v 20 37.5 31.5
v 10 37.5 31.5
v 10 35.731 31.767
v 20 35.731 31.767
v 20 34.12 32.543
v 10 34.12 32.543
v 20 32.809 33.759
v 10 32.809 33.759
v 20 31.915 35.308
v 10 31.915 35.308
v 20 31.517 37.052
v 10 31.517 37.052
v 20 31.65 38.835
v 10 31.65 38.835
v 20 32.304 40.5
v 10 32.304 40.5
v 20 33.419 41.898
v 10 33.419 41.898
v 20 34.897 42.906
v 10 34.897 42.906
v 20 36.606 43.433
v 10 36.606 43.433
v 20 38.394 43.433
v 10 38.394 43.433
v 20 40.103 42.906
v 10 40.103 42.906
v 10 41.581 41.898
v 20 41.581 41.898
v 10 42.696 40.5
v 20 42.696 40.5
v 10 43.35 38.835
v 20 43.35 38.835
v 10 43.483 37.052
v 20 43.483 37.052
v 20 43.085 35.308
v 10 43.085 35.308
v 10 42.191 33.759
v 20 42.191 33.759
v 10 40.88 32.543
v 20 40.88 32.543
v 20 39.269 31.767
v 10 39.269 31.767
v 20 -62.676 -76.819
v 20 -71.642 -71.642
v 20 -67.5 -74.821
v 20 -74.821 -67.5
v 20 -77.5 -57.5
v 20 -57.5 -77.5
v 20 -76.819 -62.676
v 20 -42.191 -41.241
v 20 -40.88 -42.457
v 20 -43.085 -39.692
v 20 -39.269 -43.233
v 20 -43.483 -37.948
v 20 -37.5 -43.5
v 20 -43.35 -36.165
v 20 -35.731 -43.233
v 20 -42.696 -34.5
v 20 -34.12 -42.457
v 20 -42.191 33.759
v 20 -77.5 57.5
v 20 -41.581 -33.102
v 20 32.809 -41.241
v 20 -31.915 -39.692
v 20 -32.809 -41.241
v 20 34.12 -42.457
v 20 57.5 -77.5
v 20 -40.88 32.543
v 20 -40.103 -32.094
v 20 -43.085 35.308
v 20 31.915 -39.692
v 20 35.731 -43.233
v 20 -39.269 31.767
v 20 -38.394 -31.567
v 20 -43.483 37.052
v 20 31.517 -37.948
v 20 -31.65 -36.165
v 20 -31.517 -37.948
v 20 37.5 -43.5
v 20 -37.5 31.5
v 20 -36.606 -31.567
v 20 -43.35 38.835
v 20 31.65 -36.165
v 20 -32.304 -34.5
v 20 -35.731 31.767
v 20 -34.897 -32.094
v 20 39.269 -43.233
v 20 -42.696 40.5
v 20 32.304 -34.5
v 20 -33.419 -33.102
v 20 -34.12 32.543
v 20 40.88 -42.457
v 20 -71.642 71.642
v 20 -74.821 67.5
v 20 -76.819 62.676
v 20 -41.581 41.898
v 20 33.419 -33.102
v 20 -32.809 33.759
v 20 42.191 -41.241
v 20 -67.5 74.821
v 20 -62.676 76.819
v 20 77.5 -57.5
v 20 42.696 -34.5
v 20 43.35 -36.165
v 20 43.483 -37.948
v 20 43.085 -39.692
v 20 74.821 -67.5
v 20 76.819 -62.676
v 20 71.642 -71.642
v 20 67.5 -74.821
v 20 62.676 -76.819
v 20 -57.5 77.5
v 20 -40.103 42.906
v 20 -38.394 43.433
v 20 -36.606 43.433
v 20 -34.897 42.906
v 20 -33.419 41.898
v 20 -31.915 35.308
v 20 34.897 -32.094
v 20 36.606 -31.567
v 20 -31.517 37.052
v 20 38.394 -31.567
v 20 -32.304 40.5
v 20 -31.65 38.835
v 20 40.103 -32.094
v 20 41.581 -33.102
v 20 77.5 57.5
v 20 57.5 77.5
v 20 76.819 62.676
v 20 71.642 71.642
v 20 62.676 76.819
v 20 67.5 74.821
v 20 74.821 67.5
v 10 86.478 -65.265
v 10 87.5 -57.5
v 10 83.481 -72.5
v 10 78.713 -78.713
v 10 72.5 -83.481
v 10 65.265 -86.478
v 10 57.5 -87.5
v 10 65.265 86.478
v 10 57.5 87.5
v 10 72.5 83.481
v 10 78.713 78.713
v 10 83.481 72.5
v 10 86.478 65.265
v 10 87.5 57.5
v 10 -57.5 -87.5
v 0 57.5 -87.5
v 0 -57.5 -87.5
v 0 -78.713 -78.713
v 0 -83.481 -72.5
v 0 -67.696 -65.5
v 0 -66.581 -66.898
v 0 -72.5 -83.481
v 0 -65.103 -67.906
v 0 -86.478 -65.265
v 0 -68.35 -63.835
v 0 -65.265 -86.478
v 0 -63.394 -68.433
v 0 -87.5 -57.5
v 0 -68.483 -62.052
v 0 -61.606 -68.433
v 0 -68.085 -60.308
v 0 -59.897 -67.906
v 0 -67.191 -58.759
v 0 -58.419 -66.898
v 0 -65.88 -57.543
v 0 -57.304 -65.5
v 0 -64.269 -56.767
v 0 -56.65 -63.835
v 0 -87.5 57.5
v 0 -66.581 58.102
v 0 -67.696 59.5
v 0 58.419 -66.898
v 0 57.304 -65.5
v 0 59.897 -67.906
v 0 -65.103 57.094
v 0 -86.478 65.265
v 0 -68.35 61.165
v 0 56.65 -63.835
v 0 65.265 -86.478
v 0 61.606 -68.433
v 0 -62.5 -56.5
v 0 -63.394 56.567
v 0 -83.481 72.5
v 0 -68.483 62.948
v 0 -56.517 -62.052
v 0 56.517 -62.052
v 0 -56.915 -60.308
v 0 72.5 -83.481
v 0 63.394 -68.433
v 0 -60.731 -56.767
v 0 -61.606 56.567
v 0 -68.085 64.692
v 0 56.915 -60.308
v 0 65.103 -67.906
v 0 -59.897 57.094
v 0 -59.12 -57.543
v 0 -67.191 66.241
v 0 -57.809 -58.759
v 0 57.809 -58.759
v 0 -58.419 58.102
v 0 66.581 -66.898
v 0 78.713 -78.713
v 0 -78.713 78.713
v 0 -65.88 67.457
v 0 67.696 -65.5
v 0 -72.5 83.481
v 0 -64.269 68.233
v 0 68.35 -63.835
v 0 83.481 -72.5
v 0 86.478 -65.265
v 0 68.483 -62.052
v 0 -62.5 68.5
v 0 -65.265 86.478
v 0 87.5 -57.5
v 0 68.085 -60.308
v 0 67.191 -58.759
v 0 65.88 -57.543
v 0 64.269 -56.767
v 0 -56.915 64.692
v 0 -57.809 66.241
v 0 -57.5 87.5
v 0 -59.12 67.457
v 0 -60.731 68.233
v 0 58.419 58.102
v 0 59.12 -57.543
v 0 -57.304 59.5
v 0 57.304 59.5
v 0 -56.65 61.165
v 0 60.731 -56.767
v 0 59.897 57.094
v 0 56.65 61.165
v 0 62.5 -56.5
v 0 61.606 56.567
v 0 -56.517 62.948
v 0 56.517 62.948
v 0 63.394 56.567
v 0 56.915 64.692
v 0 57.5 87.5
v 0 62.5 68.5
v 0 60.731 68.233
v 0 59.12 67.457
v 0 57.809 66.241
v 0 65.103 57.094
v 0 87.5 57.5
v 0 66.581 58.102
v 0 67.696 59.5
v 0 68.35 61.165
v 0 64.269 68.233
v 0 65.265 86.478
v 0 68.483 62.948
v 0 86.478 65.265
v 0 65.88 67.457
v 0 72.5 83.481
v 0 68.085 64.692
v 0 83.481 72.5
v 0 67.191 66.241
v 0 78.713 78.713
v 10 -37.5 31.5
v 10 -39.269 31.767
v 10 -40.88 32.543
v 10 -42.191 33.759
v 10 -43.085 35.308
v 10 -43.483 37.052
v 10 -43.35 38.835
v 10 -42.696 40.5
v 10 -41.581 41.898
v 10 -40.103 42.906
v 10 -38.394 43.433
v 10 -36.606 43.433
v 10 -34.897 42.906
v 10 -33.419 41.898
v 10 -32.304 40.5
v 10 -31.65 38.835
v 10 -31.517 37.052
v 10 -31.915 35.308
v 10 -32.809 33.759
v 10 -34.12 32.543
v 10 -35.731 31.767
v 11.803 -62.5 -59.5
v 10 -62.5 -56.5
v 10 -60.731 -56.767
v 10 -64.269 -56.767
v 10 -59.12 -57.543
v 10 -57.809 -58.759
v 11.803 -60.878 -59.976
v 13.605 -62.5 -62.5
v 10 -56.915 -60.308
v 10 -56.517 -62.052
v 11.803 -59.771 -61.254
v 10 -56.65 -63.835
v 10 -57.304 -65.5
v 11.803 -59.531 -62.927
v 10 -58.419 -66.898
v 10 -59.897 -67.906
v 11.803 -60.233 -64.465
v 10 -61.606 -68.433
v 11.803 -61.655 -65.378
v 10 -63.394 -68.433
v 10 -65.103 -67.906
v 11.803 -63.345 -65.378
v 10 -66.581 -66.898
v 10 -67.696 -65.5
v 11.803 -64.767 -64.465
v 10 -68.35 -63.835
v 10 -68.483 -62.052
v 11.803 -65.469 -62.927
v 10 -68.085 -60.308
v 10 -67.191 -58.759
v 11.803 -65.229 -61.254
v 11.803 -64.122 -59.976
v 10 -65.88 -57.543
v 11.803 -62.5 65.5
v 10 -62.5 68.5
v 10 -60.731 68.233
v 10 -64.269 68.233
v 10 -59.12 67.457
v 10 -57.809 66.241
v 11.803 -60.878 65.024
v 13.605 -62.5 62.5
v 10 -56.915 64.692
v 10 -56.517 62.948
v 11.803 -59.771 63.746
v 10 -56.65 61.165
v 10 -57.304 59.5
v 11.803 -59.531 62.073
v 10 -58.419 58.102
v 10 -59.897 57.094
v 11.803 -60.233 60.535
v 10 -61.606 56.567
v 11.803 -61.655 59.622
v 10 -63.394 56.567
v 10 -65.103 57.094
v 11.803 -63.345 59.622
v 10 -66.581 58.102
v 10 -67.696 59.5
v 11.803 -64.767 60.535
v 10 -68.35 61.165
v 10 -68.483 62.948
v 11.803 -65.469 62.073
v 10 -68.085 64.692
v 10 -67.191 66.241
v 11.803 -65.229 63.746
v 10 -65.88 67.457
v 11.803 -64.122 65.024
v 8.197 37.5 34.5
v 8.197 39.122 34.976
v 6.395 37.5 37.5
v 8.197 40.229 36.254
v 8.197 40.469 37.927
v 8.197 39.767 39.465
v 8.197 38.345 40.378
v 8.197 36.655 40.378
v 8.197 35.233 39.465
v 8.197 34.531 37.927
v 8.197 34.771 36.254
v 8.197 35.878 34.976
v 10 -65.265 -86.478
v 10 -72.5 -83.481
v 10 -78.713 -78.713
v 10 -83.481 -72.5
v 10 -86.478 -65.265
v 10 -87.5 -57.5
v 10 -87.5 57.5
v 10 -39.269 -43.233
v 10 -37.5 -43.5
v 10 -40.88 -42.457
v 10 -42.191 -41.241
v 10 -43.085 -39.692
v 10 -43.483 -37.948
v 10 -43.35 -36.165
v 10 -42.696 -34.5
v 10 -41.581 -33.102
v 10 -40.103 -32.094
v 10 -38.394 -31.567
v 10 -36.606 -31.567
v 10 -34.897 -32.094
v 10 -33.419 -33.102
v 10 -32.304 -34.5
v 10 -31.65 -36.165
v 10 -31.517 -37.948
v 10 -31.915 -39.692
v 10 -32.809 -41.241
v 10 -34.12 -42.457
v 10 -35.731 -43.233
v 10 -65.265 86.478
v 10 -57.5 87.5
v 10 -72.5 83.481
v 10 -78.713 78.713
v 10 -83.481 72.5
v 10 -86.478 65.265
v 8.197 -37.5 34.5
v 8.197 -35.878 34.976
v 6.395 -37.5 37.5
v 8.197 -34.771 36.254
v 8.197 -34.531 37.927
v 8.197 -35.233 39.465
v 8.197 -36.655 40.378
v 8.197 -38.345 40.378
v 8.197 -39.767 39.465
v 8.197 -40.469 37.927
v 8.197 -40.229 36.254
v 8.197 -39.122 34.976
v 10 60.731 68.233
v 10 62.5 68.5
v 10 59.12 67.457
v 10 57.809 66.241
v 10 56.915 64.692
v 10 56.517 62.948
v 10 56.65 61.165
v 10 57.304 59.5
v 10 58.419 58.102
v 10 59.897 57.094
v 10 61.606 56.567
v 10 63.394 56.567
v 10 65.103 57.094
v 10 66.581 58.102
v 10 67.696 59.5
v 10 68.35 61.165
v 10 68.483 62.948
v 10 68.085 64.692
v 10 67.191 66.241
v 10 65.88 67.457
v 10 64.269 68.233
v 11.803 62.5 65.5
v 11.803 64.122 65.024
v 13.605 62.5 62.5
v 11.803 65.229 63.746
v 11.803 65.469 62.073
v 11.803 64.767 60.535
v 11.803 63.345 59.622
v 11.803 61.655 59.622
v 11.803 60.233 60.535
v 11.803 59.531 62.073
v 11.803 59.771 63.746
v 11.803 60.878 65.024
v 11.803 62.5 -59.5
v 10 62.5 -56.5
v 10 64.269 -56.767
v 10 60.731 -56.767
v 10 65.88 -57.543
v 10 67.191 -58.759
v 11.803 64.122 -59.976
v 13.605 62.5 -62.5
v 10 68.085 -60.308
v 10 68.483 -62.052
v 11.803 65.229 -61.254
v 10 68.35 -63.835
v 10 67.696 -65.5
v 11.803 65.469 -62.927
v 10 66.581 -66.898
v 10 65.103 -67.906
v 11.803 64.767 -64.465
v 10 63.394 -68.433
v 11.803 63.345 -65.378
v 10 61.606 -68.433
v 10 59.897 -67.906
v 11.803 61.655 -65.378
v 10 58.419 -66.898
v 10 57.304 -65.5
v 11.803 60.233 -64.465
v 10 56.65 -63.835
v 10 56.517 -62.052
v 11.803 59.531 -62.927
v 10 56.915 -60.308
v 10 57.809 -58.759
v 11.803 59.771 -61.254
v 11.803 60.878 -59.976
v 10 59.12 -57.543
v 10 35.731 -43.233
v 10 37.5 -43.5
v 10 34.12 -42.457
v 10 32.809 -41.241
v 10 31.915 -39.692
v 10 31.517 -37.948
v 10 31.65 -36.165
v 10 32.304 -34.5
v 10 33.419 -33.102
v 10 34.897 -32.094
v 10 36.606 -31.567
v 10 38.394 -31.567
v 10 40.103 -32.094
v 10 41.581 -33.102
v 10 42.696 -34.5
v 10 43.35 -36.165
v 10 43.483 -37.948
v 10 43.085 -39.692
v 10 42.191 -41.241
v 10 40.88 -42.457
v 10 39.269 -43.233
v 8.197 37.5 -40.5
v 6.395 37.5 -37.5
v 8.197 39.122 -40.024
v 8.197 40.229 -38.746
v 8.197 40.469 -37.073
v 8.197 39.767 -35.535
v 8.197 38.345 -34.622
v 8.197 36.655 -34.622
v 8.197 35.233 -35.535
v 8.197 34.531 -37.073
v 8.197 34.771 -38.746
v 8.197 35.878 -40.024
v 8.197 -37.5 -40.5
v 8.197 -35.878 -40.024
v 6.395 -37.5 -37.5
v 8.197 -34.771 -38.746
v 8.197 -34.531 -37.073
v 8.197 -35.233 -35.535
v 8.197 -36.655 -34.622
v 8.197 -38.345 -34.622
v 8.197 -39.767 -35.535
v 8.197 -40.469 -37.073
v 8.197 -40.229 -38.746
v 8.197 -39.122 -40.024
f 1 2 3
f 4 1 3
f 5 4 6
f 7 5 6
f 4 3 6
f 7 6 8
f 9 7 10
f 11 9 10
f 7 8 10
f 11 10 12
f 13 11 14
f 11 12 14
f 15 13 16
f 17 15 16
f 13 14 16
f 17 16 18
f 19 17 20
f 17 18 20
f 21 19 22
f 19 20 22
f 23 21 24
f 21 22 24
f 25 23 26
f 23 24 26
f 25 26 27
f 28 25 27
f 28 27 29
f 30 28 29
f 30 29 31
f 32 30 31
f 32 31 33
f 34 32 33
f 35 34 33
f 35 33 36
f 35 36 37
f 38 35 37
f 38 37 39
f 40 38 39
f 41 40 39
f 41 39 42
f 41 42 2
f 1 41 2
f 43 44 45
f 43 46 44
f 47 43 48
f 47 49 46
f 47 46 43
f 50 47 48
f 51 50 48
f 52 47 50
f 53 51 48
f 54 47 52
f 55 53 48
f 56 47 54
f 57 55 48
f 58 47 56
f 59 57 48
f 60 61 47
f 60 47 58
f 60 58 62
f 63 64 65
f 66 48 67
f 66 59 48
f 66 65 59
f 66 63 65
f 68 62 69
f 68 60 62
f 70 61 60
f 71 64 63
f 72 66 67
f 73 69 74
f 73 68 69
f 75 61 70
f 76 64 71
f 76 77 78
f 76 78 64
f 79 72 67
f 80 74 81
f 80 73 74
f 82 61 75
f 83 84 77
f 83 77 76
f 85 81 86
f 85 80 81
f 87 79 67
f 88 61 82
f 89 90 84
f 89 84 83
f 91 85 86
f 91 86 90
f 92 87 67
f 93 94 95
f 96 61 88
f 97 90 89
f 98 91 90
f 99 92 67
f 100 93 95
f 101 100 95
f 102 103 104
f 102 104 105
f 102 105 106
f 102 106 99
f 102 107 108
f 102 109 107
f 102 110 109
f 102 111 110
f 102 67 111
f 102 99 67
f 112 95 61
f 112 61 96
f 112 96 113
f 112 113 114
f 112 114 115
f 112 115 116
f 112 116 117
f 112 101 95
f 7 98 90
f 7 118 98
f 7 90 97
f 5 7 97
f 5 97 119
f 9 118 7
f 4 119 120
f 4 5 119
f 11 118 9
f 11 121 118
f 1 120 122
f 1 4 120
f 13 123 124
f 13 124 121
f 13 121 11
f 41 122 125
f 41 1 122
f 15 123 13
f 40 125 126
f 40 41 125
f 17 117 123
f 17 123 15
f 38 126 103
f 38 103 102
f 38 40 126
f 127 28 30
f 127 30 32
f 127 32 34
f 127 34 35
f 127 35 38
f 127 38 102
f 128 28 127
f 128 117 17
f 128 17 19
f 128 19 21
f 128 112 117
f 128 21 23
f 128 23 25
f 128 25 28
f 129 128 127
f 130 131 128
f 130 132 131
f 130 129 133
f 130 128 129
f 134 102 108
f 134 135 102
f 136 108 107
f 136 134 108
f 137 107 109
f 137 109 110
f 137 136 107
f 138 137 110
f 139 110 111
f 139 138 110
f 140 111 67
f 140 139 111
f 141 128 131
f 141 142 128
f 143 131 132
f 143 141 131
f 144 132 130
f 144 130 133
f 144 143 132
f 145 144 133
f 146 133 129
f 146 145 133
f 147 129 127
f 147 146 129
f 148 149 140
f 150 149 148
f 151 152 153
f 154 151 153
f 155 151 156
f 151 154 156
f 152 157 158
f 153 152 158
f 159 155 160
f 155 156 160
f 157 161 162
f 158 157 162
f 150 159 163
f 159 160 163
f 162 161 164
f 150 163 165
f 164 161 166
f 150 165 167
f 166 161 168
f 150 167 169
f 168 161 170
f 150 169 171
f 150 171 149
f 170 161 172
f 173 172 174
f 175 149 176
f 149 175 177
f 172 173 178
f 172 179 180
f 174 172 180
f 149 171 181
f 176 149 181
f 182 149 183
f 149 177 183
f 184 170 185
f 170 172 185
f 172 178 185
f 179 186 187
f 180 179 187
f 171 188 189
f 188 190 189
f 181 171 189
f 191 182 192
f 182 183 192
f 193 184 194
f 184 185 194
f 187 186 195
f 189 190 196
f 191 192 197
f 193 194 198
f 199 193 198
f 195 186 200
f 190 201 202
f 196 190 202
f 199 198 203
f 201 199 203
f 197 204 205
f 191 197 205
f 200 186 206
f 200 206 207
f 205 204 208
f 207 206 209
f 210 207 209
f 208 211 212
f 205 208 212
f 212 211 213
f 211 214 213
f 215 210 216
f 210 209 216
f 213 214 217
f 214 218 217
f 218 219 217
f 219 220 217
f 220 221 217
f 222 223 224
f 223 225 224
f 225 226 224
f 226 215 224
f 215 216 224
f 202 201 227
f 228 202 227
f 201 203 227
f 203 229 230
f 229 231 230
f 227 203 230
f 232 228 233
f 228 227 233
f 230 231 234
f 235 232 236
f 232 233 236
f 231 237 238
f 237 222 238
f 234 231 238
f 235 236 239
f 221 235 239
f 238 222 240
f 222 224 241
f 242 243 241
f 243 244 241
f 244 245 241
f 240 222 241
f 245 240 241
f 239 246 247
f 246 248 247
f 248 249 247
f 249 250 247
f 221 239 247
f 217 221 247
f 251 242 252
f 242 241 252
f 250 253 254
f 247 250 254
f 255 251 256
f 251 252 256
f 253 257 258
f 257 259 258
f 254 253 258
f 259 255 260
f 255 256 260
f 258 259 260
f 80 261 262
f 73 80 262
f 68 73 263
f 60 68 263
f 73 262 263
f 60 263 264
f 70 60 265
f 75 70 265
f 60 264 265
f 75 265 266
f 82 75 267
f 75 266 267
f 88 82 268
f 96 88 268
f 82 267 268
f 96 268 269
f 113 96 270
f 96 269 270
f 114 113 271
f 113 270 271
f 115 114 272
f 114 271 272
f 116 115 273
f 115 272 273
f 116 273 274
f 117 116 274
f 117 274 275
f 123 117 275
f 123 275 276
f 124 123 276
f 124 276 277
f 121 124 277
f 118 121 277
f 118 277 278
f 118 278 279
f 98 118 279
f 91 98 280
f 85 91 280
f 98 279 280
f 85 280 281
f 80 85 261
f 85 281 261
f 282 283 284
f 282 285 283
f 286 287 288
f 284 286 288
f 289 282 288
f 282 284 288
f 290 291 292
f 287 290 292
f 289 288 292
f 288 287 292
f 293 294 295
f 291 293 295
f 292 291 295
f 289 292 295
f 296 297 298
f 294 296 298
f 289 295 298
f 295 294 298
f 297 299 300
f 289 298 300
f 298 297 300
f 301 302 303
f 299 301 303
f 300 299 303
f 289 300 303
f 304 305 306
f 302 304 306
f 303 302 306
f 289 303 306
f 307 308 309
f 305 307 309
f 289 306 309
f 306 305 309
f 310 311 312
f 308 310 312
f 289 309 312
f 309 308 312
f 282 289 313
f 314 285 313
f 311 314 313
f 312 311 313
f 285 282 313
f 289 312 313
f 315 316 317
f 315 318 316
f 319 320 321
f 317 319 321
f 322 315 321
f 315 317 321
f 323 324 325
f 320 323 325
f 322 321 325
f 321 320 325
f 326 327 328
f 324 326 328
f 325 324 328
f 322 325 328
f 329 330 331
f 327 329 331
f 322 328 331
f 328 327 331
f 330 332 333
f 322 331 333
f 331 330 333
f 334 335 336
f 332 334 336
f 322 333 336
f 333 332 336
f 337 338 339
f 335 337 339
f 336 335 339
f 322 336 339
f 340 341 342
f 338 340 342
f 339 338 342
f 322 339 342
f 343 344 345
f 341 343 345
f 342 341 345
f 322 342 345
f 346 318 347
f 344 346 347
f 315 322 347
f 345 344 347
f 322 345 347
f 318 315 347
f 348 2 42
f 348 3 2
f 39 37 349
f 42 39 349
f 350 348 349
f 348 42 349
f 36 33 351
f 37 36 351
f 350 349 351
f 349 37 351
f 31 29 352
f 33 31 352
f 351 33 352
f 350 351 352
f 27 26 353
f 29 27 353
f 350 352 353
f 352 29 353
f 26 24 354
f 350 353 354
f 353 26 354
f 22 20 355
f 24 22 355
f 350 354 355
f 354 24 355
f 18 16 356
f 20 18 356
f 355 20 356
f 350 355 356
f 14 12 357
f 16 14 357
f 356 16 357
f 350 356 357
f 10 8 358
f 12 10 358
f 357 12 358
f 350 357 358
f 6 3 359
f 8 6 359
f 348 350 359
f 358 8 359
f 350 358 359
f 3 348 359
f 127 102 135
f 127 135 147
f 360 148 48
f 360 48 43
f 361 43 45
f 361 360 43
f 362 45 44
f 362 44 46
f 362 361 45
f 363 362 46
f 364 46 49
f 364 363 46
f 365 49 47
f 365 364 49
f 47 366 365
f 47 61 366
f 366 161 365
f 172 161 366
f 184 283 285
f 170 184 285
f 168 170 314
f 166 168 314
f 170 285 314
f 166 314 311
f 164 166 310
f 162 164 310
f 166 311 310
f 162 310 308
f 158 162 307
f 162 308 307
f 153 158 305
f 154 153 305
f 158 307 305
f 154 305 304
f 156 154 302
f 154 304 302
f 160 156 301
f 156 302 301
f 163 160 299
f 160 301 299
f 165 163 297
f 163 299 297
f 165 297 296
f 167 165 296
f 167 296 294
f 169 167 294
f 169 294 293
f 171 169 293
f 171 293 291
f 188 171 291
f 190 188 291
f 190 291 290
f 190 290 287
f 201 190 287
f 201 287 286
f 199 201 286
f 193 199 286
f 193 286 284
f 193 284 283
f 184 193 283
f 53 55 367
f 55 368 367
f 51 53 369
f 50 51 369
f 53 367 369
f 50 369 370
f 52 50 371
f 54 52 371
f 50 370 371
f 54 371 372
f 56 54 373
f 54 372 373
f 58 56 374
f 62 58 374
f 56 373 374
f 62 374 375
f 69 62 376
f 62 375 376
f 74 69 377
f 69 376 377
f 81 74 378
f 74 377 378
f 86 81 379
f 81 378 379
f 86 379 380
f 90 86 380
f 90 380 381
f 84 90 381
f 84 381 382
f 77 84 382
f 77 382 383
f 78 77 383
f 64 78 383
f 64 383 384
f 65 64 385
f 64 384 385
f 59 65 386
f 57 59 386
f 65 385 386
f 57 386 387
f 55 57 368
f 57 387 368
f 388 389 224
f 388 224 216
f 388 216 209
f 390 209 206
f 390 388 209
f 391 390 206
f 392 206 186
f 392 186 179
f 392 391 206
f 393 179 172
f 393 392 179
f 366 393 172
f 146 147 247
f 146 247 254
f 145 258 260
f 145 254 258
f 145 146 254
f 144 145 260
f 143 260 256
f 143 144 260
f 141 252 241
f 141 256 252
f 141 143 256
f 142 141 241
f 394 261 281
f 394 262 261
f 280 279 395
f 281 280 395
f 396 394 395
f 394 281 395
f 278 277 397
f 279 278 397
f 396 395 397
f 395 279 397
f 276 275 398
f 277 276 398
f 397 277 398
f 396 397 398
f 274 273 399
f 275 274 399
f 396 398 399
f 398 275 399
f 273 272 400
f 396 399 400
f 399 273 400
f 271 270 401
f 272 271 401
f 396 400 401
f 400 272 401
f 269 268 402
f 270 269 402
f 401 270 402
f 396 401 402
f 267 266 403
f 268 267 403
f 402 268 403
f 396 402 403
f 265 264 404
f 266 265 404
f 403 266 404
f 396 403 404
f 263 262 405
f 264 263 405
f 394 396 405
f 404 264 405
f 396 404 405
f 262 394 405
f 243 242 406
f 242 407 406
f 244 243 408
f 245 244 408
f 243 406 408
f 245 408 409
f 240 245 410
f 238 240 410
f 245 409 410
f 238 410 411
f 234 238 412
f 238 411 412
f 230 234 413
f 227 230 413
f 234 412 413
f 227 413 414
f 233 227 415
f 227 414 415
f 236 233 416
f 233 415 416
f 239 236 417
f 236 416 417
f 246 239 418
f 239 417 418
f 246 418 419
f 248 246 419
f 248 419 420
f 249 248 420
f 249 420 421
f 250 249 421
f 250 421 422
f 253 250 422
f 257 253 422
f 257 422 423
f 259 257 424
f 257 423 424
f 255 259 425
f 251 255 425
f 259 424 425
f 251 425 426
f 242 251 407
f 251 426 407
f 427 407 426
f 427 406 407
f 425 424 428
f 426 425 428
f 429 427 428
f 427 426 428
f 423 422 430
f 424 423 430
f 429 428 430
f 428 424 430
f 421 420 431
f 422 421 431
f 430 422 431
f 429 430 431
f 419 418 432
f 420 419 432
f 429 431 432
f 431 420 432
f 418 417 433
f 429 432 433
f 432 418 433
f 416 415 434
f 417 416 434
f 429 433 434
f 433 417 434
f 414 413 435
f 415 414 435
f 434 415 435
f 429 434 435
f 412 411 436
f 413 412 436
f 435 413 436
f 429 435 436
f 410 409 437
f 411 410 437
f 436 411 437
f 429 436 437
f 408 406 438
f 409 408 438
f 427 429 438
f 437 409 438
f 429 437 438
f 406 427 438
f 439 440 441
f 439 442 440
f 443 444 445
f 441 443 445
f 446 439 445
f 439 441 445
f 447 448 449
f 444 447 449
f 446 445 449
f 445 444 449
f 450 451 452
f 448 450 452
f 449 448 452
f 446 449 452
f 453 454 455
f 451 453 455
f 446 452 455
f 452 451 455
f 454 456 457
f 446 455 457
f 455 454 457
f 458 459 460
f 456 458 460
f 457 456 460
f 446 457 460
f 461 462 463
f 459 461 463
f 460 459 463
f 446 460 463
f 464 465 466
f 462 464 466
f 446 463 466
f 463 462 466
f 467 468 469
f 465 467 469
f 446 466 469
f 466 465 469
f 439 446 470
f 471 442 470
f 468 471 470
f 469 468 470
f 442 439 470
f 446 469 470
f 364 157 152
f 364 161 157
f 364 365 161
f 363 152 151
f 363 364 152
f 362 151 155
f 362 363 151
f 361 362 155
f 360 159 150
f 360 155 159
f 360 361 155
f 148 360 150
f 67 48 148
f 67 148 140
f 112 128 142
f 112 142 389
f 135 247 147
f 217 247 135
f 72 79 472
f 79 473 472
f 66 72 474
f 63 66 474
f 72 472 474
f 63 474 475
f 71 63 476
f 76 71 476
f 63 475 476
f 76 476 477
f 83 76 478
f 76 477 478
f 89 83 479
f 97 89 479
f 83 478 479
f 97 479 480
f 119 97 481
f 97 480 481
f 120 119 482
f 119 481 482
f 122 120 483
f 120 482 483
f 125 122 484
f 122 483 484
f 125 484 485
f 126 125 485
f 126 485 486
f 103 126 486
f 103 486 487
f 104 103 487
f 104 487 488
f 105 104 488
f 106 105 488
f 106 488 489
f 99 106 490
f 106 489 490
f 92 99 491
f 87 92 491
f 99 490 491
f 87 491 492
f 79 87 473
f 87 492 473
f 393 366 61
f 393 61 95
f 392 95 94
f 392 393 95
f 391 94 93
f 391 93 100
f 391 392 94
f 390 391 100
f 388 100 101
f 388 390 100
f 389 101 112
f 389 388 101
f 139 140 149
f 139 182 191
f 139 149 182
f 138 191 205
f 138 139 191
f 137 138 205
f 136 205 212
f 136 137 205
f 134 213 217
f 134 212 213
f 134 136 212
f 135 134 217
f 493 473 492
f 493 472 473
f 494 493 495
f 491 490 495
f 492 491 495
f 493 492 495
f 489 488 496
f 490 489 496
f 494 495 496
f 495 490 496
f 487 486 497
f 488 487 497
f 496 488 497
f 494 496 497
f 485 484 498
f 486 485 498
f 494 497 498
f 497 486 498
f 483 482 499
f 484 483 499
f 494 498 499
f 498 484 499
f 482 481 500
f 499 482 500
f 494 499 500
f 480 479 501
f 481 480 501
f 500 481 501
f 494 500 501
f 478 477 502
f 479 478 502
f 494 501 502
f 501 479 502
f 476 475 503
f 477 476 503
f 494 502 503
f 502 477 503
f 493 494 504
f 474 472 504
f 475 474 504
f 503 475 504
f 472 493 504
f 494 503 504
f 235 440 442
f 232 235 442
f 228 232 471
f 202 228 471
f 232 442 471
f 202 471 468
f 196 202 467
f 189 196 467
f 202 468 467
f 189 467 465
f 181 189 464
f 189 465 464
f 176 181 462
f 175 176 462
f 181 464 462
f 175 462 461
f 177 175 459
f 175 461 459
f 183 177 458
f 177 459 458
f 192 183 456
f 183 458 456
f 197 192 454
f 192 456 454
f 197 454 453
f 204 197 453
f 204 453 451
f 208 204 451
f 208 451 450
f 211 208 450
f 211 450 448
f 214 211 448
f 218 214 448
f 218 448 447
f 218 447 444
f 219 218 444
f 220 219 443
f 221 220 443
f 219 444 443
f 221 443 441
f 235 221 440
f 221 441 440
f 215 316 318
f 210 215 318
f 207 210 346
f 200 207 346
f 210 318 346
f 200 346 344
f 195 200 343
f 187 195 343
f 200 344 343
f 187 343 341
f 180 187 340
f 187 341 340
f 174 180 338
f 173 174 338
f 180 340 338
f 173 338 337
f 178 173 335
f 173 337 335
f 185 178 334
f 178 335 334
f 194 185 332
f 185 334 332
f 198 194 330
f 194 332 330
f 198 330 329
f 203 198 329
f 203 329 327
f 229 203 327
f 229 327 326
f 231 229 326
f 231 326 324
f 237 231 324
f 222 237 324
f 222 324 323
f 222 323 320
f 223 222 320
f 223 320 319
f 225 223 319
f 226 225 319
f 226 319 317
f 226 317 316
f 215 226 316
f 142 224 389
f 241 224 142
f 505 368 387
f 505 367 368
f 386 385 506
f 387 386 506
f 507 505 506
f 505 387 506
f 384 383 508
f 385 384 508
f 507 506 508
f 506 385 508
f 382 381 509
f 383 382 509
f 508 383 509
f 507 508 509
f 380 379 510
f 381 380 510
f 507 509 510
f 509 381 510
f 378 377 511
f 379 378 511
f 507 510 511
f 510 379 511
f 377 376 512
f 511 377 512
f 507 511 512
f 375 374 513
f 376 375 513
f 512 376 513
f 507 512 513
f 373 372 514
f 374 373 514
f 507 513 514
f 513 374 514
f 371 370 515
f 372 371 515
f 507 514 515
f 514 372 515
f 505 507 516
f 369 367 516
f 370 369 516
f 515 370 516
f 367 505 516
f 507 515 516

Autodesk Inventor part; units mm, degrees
ref_plane "YZ Plane" through (0, 0, 0) normal (1, 0, 0) x (0, 1, 0)
ref_plane "XZ Plane" through (0, 0, 0) normal (0, 1, 0) x (-1, 0, 0)
ref_plane "XY Plane" through (0, 0, 0) normal (0, 0, 1) x (1, 0, 0)
sketch "草圖1" plane through (0, 0, 0) normal (1, 0, 0) x (0, 1, 0)
  line L0 (-87.5, 87.5) -> (87.5, 87.5)
  line L1 (87.5, 87.5) -> (87.5, -87.5)
  line L2 (87.5, -87.5) -> (-87.5, -87.5)
  line L3 (-87.5, -87.5) -> (-87.5, 87.5)
  line L4 (-87.5, 87.5) -> (87.5, -87.5) construction
  line L5 (87.5, 87.5) -> (-87.5, -87.5) construction
  point P0 (0, 0)
  dimension "d0" = 175
  dimension "d1" = 175
extrude "擠出1" add sketch "草圖1" along normal blind 20
fillet "圓角1" radius 30 4 edges at (10, 87.5, 87.5) (10, -87.5, 87.5) (10, 87.5, -87.5) (10, -87.5, -87.5)
chamfer "倒角1" distance 10 angle 45 8 edges at (20, 0, 87.5) (20, -78.7132, 78.7132) (20, -87.5, 0) (20, -78.7132, -78.7132) (20, 0, -87.5) (20, 78.7132, -78.7132) (20, 87.5, 0) (20, 78.7132, 78.7132)
sketch "草圖2" plane through (20, 0, 0) normal (1, 0, 0) x (0, 0, -1)
  line L0 (-37.5, -37.5) -> (37.5, -37.5)
  line L1 (37.5, -37.5) -> (37.5, 37.5)
  line L2 (37.5, 37.5) -> (-37.5, 37.5)
  line L3 (-37.5, 37.5) -> (-37.5, -37.5)
  line L4 (-37.5, -37.5) -> (37.5, 37.5) construction
  line L5 (37.5, -37.5) -> (-37.5, 37.5) construction
  point P0 (0, 0)
  dimension "d8" = 75
  dimension "d9" = 75
hole "孔1" at (20, 37.5, 37.5) at (20, 37.5, -37.5) at (20, -37.5, 37.5) at (20, -37.5, -37.5) direction (-1, 0, 0) diameter 12 depth 10 tip angle 118
sketch "草圖3" plane through (0, 0, 0) normal (-1, 0, 0) x (0, 0, 1)
  arc A0 (-87.5, -57.5) -> (-57.5, -87.5) centre (-57.5, -57.5) ccw projected
  line L0 (-57.5, -87.5) -> (57.5, -87.5) projected
  arc A1 (57.5, -87.5) -> (87.5, -57.5) centre (57.5, -57.5) ccw projected
  line L1 (87.5, -57.5) -> (87.5, 57.5) projected
  arc A2 (87.5, 57.5) -> (57.5, 87.5) centre (57.5, 57.5) ccw projected
  line L2 (57.5, 87.5) -> (-57.5, 87.5) projected
  arc A3 (-57.5, 87.5) -> (-87.5, 57.5) centre (-57.5, 57.5) ccw projected
  line L3 (-87.5, 57.5) -> (-87.5, -57.5) projected
  line L4 (62.5, 62.5) -> (-62.5, 62.5)
  line L5 (-62.5, 62.5) -> (-62.5, -62.5)
  line L6 (-62.5, -62.5) -> (62.5, -62.5)
  line L7 (62.5, -62.5) -> (62.5, 62.5)
  line L8 (62.5, 62.5) -> (-62.5, -62.5) construction
  line L9 (-62.5, 62.5) -> (62.5, -62.5) construction
  point P0 (0, 0)
  dimension "d17" = 125
  dimension "d18" = 125
hole "孔2" at (0, -62.5, 62.5) at (0, -62.5, -62.5) at (0, 62.5, -62.5) at (0, 62.5, 62.5) direction (1, 0, 0) diameter 12 depth 10 tip angle 118
properties part number "exercise3-1-4"
